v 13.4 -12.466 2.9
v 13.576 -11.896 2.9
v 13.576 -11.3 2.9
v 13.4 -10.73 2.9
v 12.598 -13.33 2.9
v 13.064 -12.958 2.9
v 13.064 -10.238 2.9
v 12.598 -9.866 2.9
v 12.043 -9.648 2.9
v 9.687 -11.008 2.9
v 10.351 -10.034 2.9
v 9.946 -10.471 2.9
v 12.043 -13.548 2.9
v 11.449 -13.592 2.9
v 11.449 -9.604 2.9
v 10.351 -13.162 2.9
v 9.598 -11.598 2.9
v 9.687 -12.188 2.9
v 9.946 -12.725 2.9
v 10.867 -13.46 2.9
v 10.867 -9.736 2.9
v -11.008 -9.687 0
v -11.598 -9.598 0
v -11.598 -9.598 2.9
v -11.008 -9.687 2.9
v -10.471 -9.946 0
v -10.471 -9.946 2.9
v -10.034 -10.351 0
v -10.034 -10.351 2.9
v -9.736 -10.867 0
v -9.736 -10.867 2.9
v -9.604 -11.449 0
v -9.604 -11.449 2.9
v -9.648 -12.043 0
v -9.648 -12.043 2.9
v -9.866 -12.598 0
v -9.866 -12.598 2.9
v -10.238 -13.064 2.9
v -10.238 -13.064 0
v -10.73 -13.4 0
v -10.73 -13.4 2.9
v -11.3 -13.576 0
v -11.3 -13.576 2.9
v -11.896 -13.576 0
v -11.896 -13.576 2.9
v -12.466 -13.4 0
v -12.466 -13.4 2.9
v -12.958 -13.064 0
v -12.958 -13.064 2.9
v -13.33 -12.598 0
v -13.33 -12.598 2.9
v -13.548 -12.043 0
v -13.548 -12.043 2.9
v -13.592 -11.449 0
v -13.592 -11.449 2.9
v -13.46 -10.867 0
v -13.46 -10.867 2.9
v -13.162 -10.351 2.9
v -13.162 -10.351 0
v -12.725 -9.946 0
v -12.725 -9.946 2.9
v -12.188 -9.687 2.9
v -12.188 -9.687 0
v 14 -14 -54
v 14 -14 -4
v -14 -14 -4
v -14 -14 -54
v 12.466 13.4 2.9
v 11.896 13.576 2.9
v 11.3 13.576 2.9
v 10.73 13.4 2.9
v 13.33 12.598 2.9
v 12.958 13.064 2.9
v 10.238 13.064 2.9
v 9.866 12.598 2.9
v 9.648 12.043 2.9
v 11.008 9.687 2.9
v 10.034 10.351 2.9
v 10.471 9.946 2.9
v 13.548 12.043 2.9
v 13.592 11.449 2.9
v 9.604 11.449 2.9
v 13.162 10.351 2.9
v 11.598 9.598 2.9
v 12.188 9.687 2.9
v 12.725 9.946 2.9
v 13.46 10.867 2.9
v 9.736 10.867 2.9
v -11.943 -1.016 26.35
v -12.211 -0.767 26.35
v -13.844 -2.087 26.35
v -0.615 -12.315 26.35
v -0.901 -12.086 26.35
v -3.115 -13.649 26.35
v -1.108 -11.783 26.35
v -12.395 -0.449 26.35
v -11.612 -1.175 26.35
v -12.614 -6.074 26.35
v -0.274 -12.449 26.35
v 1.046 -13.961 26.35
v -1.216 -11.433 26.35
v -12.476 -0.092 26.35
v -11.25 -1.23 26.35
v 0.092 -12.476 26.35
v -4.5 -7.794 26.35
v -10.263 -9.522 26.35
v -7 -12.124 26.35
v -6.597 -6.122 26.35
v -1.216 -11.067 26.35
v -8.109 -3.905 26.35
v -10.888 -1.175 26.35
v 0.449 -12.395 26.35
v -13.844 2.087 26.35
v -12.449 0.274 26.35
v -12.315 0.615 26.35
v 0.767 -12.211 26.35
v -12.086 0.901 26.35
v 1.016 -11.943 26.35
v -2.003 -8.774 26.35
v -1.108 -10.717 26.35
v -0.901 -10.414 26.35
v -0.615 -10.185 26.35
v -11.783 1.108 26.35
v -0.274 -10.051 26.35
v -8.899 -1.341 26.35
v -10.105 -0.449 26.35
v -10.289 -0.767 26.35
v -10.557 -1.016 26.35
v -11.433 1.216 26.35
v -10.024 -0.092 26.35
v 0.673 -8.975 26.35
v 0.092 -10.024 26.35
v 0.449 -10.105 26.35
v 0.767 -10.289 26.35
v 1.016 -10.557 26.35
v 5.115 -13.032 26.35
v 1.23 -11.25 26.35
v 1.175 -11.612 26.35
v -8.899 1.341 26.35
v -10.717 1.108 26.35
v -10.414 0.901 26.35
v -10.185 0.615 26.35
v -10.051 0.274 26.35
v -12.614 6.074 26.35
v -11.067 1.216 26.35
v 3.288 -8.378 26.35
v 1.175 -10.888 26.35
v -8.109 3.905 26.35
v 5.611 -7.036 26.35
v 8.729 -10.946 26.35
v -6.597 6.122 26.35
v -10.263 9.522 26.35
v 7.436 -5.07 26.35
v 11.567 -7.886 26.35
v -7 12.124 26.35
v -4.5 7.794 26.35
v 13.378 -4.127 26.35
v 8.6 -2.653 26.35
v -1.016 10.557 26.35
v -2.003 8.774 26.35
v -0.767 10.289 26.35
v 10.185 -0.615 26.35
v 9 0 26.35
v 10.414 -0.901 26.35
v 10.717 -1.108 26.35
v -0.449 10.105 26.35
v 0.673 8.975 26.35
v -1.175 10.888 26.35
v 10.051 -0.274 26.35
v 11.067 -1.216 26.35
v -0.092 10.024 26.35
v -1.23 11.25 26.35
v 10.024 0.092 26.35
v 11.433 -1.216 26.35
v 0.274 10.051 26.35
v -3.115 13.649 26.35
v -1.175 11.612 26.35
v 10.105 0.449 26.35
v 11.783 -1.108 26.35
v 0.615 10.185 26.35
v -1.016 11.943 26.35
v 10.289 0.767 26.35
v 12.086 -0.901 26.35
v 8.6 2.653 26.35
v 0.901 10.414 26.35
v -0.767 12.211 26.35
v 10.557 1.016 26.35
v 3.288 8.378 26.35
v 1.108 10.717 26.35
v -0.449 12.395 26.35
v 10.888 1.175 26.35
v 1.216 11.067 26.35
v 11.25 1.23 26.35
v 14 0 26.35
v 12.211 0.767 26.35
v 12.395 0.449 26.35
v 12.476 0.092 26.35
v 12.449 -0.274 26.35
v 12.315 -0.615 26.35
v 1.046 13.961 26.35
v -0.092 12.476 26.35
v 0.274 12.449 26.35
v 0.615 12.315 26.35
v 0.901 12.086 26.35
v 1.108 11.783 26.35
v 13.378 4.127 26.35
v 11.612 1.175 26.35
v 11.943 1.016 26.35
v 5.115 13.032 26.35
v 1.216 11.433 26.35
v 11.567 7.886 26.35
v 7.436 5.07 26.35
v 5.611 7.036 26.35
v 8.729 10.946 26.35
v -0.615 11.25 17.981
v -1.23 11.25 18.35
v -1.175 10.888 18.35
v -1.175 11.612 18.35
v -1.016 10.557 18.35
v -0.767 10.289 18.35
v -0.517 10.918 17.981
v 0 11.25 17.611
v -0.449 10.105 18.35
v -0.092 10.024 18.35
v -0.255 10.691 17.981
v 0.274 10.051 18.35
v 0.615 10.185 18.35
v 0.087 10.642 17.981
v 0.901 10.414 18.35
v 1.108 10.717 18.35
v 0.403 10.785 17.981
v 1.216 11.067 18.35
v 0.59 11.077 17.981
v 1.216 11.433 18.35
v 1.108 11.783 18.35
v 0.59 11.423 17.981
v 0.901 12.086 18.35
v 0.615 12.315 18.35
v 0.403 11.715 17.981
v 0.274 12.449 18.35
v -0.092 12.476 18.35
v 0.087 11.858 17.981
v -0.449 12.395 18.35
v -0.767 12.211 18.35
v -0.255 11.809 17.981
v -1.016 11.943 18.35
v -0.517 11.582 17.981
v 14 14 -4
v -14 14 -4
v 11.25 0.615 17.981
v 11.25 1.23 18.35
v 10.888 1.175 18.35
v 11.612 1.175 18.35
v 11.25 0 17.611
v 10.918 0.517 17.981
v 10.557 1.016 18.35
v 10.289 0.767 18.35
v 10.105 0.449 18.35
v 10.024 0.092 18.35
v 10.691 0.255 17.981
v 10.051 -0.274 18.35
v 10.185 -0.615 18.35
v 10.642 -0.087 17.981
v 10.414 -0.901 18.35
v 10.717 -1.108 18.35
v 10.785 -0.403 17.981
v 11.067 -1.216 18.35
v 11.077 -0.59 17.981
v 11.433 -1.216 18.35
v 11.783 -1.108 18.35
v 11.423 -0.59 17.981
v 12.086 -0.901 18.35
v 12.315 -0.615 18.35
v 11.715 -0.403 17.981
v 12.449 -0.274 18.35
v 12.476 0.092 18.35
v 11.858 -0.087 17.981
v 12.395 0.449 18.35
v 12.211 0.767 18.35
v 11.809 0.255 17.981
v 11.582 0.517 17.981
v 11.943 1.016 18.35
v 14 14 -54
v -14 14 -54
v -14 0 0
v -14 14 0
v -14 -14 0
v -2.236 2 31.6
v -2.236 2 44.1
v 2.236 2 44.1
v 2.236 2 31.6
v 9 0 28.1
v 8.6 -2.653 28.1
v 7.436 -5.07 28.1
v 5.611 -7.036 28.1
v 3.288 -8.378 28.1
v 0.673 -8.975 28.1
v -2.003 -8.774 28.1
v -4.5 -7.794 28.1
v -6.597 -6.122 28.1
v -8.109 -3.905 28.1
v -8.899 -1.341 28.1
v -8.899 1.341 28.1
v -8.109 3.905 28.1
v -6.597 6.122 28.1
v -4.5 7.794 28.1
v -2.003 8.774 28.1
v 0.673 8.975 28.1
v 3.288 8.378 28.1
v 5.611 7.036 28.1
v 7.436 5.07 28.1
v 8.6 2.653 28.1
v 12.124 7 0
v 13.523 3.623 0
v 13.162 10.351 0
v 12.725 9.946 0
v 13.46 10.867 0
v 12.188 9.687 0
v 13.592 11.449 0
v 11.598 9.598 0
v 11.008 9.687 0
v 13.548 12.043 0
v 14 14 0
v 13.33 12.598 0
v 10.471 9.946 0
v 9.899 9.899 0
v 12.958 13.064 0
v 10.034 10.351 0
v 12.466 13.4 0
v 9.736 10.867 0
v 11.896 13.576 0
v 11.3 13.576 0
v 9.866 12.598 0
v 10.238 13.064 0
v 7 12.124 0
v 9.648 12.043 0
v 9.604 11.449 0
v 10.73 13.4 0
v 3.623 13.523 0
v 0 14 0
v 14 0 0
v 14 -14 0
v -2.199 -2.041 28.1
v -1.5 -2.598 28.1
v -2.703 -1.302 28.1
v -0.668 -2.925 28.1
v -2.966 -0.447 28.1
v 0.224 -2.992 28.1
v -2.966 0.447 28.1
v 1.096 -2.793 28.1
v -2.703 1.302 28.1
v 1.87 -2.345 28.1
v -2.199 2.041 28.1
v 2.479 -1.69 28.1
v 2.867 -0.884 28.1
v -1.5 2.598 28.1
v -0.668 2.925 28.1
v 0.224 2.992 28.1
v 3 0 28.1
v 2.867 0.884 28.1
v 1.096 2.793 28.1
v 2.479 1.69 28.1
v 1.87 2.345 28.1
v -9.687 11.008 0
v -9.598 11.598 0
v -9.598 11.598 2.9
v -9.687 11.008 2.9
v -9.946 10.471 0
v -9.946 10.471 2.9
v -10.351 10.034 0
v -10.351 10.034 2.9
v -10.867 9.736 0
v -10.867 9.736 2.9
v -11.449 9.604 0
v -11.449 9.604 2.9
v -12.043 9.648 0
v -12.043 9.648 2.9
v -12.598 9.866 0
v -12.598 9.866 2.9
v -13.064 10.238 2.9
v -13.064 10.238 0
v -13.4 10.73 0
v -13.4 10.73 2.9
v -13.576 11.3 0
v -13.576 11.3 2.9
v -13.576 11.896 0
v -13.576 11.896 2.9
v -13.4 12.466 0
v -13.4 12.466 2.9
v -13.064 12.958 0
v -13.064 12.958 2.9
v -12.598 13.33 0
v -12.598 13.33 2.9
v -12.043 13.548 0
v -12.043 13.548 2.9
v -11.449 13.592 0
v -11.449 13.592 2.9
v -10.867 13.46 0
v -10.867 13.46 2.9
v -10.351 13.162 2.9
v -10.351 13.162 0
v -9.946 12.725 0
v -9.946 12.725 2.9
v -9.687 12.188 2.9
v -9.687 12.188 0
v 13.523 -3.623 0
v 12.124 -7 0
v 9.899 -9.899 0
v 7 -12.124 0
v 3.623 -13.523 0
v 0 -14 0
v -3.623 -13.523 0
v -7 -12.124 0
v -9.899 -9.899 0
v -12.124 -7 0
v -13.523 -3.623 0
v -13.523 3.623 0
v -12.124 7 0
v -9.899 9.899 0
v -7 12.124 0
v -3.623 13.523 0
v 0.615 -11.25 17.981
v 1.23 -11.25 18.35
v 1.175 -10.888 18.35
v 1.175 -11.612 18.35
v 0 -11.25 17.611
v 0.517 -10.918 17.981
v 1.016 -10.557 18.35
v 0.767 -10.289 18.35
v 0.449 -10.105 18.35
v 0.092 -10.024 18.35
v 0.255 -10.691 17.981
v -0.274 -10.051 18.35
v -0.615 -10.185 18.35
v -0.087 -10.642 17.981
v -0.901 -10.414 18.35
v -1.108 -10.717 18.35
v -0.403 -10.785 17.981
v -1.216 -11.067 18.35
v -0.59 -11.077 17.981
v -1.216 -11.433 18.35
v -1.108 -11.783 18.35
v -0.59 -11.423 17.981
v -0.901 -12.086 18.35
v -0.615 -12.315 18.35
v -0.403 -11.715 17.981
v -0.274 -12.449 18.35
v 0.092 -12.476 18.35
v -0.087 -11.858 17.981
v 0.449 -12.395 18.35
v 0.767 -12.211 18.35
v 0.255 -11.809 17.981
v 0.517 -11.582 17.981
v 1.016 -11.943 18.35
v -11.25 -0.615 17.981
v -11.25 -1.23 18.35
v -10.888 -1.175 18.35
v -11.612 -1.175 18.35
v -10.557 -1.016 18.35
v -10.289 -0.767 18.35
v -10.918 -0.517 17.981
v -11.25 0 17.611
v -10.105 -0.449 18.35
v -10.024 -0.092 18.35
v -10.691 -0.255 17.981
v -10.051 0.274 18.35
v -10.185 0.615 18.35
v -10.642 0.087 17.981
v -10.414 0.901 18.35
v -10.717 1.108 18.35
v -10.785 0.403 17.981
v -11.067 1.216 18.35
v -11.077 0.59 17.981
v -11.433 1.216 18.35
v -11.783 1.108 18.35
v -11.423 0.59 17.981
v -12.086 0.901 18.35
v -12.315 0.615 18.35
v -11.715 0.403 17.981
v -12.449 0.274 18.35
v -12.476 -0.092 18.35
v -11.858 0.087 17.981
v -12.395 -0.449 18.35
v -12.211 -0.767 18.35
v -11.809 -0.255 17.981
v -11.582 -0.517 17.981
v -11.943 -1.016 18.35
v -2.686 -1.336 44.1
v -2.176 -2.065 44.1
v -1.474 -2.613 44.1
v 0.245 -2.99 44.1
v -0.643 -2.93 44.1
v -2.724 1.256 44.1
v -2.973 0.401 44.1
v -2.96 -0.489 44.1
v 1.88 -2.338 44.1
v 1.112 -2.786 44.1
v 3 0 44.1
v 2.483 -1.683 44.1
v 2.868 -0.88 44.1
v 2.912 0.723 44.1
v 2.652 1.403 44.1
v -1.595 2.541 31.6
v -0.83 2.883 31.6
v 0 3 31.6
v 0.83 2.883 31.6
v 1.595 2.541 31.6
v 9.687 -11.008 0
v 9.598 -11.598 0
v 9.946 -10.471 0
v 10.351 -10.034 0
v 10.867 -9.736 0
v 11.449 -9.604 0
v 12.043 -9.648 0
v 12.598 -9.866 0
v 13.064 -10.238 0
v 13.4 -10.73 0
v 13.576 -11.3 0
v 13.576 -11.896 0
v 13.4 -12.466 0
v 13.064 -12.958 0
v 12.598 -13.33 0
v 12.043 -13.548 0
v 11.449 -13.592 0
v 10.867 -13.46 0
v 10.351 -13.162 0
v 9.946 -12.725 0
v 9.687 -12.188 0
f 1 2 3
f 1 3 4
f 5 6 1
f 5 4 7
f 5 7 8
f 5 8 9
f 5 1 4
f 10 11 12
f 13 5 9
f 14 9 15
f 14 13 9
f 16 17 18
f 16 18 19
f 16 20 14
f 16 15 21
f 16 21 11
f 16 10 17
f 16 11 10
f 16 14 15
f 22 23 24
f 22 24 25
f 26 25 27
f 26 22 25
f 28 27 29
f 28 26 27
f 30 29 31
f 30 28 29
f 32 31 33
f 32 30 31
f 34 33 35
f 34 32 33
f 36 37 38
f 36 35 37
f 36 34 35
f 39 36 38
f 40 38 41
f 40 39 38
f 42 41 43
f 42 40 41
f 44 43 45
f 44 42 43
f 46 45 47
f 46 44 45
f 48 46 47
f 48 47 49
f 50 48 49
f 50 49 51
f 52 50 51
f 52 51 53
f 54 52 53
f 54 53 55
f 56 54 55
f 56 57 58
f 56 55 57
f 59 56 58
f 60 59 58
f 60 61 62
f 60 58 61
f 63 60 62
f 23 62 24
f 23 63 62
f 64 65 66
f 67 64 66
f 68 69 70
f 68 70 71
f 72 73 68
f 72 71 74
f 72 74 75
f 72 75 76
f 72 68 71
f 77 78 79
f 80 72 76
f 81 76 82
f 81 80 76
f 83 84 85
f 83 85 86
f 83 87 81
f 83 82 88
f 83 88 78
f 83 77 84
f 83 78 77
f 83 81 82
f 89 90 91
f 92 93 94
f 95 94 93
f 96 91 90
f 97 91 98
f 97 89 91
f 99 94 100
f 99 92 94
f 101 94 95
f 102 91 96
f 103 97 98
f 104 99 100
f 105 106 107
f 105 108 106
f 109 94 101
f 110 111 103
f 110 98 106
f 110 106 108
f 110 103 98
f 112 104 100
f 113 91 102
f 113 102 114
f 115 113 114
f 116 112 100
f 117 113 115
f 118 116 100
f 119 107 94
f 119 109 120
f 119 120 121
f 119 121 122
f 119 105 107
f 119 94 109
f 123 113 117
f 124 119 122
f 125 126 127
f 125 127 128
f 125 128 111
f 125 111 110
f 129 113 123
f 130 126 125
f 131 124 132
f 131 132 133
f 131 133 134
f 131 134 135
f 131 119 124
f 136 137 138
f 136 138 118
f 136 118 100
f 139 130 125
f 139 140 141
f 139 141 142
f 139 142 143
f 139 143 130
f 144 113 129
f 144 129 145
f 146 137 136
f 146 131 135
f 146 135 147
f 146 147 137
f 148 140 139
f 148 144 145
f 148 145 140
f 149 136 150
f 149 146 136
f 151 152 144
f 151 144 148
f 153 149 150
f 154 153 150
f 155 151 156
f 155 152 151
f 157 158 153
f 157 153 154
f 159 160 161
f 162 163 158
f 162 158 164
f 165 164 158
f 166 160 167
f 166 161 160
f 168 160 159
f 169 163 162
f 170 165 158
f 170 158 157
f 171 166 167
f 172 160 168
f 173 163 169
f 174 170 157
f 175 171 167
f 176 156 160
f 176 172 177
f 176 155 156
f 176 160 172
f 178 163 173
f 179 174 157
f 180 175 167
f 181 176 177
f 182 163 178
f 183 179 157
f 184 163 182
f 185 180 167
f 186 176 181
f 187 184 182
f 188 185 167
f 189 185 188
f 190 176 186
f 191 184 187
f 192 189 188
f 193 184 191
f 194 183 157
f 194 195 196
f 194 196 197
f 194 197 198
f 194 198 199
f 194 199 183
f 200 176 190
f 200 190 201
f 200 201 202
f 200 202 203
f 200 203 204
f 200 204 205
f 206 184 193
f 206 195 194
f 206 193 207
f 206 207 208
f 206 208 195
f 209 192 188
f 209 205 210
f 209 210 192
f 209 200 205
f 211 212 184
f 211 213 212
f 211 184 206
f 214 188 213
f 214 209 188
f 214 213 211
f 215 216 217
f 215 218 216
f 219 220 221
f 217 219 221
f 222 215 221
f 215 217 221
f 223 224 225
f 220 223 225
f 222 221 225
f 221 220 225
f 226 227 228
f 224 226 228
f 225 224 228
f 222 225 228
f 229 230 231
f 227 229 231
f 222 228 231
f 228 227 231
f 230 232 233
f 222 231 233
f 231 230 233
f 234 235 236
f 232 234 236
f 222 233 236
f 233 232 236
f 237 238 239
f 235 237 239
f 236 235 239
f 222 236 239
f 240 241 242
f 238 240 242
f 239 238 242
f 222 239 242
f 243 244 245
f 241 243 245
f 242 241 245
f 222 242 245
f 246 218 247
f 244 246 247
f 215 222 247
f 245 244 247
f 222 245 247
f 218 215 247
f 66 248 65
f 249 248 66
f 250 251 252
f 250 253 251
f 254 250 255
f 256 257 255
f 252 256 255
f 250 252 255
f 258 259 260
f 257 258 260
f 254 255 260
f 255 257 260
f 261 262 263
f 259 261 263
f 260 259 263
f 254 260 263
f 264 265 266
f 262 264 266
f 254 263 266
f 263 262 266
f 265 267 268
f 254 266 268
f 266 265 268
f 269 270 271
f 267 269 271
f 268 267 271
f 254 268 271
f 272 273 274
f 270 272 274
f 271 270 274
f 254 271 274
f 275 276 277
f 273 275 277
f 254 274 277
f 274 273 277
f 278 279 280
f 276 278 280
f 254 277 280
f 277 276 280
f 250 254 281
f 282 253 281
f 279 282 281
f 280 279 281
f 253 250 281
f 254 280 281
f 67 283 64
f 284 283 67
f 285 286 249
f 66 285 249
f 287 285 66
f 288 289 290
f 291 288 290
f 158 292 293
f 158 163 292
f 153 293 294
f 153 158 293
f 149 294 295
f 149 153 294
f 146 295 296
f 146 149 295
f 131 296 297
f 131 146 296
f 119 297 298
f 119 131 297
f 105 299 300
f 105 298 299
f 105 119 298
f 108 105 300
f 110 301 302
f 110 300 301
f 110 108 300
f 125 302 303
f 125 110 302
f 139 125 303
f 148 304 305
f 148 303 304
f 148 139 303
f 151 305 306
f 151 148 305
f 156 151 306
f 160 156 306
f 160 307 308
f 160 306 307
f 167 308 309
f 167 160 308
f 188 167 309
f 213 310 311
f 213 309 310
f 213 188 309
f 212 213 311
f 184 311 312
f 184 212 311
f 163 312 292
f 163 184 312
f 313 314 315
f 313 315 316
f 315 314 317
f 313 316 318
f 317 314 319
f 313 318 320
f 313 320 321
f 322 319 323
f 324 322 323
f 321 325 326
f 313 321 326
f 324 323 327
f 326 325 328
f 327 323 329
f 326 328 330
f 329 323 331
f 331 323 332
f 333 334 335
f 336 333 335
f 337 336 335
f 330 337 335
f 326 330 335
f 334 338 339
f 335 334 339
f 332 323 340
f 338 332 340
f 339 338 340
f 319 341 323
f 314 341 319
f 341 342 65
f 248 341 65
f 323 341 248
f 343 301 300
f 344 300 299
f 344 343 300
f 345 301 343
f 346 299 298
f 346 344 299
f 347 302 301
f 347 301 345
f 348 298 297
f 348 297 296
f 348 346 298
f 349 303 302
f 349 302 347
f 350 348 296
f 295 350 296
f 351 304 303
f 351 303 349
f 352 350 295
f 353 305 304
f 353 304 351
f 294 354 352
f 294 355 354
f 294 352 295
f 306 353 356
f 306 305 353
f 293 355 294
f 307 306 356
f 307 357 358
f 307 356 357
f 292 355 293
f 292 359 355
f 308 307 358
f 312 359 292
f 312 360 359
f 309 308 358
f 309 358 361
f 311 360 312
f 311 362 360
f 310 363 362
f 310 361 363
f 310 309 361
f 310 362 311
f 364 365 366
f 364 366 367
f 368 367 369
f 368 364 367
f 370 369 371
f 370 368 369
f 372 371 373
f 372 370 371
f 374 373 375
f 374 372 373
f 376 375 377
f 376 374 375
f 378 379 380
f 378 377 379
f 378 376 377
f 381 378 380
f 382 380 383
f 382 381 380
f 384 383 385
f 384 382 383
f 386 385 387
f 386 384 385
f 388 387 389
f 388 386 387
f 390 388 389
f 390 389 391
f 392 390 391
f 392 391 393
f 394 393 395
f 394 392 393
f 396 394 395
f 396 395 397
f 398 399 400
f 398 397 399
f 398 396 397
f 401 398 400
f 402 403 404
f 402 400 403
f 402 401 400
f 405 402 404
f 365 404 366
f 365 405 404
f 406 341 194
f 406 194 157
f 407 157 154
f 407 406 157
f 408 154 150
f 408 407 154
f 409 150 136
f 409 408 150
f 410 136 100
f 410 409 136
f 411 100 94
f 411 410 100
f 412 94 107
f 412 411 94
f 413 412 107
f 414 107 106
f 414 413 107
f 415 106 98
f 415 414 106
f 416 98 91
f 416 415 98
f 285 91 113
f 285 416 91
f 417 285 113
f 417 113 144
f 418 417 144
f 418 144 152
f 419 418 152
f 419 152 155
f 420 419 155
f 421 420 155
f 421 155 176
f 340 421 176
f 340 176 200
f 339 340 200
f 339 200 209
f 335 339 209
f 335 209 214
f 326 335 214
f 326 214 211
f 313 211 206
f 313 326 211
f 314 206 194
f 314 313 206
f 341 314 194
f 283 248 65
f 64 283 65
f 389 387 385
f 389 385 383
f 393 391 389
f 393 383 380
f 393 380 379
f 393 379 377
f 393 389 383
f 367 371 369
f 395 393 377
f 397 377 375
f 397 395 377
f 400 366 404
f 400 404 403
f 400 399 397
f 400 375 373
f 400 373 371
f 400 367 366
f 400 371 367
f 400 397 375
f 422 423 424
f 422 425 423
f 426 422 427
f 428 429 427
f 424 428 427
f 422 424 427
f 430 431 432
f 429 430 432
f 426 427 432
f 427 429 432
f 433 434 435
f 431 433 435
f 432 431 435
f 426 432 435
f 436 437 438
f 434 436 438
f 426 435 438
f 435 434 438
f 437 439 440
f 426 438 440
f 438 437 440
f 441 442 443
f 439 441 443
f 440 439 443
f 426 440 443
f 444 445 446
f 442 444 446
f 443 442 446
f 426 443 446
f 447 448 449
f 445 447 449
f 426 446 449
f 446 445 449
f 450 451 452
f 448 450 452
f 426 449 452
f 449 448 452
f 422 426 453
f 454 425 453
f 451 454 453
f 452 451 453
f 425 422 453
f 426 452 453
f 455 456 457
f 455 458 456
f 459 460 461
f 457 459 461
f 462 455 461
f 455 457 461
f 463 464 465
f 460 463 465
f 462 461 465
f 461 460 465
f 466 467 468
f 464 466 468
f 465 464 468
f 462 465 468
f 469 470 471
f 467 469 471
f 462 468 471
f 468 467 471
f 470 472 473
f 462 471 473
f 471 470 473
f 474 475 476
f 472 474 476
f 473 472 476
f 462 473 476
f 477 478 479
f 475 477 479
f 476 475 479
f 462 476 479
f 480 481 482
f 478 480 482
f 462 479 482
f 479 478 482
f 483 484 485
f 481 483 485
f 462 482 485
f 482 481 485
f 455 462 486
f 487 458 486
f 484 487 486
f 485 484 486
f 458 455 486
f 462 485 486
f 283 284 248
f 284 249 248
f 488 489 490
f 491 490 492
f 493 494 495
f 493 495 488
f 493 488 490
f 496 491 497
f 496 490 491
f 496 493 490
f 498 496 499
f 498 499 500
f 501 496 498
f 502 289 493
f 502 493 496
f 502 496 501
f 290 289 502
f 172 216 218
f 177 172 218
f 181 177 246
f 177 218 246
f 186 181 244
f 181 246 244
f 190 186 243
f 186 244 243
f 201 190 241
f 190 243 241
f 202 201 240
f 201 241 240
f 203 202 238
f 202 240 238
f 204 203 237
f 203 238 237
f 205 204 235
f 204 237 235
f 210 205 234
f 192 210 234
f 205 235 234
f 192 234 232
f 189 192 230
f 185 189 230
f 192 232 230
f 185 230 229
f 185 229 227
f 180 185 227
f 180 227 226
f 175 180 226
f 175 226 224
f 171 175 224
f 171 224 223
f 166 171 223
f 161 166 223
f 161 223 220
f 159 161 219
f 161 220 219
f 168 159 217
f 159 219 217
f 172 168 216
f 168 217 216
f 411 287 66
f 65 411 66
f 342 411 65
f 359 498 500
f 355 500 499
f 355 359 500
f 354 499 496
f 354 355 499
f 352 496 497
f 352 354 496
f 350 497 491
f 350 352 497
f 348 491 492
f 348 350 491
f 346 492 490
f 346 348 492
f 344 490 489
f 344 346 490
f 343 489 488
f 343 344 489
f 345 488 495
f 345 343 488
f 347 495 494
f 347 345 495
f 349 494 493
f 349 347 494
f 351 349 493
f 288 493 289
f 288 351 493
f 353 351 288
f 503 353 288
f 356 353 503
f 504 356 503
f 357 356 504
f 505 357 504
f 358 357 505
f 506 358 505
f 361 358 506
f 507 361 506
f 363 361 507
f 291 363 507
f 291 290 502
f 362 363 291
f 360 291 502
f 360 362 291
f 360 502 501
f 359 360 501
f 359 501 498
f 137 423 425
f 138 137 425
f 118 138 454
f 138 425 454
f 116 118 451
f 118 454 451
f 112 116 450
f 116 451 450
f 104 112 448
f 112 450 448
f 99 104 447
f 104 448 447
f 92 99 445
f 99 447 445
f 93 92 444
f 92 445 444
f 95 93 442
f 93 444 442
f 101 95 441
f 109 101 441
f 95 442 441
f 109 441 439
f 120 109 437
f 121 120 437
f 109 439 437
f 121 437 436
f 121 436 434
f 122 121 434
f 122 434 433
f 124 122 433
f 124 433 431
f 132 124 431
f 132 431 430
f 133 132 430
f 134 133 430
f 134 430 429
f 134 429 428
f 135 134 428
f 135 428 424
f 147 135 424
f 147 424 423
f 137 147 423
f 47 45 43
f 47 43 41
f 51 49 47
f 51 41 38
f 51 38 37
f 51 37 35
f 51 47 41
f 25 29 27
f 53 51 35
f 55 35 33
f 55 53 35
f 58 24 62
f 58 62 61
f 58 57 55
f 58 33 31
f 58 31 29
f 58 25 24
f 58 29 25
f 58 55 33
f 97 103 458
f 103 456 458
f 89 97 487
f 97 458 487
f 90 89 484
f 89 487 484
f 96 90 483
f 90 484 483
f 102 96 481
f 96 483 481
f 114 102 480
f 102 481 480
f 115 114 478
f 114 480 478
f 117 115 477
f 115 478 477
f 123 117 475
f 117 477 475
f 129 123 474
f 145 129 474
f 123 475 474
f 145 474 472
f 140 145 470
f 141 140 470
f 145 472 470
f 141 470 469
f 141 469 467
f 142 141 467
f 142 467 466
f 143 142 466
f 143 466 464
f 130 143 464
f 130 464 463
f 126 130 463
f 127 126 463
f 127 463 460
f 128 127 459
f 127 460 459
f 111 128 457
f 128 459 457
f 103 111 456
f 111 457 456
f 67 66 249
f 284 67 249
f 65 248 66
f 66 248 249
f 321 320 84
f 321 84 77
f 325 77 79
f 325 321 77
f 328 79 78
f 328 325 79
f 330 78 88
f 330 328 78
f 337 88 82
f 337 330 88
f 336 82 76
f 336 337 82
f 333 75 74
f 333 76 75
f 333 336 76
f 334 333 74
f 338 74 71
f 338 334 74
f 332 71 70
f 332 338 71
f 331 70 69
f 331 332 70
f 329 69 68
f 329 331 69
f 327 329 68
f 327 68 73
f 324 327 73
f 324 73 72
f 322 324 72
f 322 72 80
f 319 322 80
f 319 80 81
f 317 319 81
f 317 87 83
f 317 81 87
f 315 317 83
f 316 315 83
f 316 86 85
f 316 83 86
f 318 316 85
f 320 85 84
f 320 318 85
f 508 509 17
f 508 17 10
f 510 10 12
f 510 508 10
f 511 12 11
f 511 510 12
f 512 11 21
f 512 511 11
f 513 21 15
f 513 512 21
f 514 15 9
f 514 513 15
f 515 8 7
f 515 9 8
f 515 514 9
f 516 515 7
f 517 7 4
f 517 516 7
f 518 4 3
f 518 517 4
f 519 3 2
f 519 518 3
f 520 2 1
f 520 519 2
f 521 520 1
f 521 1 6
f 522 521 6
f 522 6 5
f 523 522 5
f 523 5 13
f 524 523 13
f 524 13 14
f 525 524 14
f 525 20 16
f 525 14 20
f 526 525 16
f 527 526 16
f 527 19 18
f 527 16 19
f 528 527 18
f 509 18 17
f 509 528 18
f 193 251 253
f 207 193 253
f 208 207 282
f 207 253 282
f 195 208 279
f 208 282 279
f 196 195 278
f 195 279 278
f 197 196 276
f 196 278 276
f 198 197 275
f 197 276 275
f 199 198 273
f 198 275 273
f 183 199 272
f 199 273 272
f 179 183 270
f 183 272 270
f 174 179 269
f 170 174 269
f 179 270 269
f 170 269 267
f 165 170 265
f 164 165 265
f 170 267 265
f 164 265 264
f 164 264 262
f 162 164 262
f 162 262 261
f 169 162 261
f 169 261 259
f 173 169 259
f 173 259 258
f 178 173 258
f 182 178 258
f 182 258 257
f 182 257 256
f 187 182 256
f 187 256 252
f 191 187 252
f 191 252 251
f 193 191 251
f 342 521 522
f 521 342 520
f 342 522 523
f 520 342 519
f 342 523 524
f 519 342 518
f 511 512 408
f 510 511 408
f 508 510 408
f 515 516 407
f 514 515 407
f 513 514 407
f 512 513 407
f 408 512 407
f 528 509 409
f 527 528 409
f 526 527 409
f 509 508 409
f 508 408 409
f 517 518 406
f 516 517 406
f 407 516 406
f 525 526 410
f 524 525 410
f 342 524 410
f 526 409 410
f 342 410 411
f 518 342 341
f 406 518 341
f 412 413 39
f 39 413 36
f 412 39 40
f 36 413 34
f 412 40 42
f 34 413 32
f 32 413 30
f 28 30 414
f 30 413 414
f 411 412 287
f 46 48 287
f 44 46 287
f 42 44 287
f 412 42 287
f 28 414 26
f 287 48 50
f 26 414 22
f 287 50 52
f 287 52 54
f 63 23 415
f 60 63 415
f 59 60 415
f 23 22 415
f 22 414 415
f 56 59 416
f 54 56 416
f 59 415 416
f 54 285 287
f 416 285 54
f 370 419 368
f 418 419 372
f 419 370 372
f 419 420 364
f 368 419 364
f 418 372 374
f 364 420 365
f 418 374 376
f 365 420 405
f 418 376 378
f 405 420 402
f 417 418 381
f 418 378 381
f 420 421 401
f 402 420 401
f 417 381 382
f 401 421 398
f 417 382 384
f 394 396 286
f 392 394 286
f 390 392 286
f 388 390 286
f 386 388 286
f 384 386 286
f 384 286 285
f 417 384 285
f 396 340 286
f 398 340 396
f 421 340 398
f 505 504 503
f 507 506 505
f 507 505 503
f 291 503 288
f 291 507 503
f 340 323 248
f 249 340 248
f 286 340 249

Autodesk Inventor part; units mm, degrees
ref_plane "YZ Plane" through (0, 0, 0) normal (1, 0, 0) x (0, 1, 0)
ref_plane "XZ Plane" through (0, 0, 0) normal (0, 1, 0) x (-1, 0, 0)
ref_plane "XY Plane" through (0, 0, 0) normal (0, 0, 1) x (1, 0, 0)
sketch "Skizze1" plane through (0, 0, 0) normal (0, 0, 1) x (1, 0, 0)
  circle A0 centre (0, 0) radius 14
  dimension "d0" = 28
extrude "Extrusion1" add sketch "Skizze1" along normal blind 26.35
sketch "Skizze2" plane through (0, 0, 26.35) normal (0, 0, 1) x (1, 0, 0)
  circle A0 centre (0, 0) radius 14 projected
  circle A1 centre (0, 0) radius 9
  dimension "d3" = 18
extrude "Extrusion2" add sketch "Skizze2" along normal blind 1.75 contours A1
sketch "Skizze3" plane through (0, 0, 26.35) normal (0, 0, 1) x (1, 0, 0)
  circle A0 centre (0, 0) radius 14 projected
  line L0 (0, 0) -> (-11.25, 0) construction
  dimension "d6" = 11.25
hole "Bohrung1" at (-11.25, 0, 26.35) direction (0, 0, -1) diameter 2.459 depth 8 tip angle 118 thread size "M3x0.5" class "6H" standard "ANSI Metric M Profile"
sketch "Skizze4" plane through (0, 0, 28.1) normal (0, 0, 1) x (1, 0, 0)
  circle A0 centre (0, 0) radius 9 projected
  circle A1 centre (0, 0) radius 3
  dimension "d14" = 6
extrude "Extrusion3" add sketch "Skizze4" along normal blind 16 contours A1
sketch "Skizze5" plane through (0, 0, 44.1) normal (0, 0, 1) x (1, 0, 0)
  circle A0 centre (0, 0) radius 3 projected
  line L0 (-2.2361, 2) -> (2.2361, 2)
  dimension "d17" = 5
extrude "Extrusion4" cut sketch "Skizze5" against normal blind 12.5 contours L0 A0 picked at (-0.5653, 2.1582)
pattern_circular "Runde Anordnung1" count 4 over 360 about axis through (0, 0, 28.1) along (0, 0, 1) of "Bohrung1"
sketch "Skizze6" plane through (0, 0, 0) normal (0, 0, -1) x (-1, 0, 0)
  circle A0 centre (0, 0) radius 14 projected
  line L0 (-14, 14) -> (14, 14)
  line L1 (14, 14) -> (14, -14)
  line L2 (14, -14) -> (-14, -14)
  line L3 (-14, -14) -> (-14, 14)
extrude "Extrusion5" add sketch "Skizze6" along normal blind 4
sketch "Skizze7" plane through (0, 0, 0) normal (0, 0, 1) x (1, 0, 0)
  line L0 (0, 14) -> (-14, 14) projected
  line L1 (-14, 14) -> (-14, 0) projected
  circle A0 centre (-11.598, 11.598) radius 2.402
  circle A1 centre (0, 0) radius 14 projected
  circle A2 centre (-11.598, 11.598) radius 2
  dimension "d25" = 4
extrude "Extrusion6" add sketch "Skizze7" along normal blind 2.9 contours A2
pattern_circular "Runde Anordnung3" count 4 over 360 about axis through (0, 0, 0) along (0, 0, 1) of "Extrusion6"
sketch "Skizze8" plane through (0, 0, -4) normal (0, 0, -1) x (-1, 0, 0)
  line L0 (14, 14) -> (-14, 14) projected
  line L1 (-14, 14) -> (-14, -14) projected
  line L2 (-14, -14) -> (14, -14) projected
  line L3 (14, -14) -> (14, 14) projected
  point P0 (0, 0)
extrude "Extrusion7" add sketch "Skizze8" along normal blind 50 separate body
properties part number "Nema17 Geared" material "Stahl"
